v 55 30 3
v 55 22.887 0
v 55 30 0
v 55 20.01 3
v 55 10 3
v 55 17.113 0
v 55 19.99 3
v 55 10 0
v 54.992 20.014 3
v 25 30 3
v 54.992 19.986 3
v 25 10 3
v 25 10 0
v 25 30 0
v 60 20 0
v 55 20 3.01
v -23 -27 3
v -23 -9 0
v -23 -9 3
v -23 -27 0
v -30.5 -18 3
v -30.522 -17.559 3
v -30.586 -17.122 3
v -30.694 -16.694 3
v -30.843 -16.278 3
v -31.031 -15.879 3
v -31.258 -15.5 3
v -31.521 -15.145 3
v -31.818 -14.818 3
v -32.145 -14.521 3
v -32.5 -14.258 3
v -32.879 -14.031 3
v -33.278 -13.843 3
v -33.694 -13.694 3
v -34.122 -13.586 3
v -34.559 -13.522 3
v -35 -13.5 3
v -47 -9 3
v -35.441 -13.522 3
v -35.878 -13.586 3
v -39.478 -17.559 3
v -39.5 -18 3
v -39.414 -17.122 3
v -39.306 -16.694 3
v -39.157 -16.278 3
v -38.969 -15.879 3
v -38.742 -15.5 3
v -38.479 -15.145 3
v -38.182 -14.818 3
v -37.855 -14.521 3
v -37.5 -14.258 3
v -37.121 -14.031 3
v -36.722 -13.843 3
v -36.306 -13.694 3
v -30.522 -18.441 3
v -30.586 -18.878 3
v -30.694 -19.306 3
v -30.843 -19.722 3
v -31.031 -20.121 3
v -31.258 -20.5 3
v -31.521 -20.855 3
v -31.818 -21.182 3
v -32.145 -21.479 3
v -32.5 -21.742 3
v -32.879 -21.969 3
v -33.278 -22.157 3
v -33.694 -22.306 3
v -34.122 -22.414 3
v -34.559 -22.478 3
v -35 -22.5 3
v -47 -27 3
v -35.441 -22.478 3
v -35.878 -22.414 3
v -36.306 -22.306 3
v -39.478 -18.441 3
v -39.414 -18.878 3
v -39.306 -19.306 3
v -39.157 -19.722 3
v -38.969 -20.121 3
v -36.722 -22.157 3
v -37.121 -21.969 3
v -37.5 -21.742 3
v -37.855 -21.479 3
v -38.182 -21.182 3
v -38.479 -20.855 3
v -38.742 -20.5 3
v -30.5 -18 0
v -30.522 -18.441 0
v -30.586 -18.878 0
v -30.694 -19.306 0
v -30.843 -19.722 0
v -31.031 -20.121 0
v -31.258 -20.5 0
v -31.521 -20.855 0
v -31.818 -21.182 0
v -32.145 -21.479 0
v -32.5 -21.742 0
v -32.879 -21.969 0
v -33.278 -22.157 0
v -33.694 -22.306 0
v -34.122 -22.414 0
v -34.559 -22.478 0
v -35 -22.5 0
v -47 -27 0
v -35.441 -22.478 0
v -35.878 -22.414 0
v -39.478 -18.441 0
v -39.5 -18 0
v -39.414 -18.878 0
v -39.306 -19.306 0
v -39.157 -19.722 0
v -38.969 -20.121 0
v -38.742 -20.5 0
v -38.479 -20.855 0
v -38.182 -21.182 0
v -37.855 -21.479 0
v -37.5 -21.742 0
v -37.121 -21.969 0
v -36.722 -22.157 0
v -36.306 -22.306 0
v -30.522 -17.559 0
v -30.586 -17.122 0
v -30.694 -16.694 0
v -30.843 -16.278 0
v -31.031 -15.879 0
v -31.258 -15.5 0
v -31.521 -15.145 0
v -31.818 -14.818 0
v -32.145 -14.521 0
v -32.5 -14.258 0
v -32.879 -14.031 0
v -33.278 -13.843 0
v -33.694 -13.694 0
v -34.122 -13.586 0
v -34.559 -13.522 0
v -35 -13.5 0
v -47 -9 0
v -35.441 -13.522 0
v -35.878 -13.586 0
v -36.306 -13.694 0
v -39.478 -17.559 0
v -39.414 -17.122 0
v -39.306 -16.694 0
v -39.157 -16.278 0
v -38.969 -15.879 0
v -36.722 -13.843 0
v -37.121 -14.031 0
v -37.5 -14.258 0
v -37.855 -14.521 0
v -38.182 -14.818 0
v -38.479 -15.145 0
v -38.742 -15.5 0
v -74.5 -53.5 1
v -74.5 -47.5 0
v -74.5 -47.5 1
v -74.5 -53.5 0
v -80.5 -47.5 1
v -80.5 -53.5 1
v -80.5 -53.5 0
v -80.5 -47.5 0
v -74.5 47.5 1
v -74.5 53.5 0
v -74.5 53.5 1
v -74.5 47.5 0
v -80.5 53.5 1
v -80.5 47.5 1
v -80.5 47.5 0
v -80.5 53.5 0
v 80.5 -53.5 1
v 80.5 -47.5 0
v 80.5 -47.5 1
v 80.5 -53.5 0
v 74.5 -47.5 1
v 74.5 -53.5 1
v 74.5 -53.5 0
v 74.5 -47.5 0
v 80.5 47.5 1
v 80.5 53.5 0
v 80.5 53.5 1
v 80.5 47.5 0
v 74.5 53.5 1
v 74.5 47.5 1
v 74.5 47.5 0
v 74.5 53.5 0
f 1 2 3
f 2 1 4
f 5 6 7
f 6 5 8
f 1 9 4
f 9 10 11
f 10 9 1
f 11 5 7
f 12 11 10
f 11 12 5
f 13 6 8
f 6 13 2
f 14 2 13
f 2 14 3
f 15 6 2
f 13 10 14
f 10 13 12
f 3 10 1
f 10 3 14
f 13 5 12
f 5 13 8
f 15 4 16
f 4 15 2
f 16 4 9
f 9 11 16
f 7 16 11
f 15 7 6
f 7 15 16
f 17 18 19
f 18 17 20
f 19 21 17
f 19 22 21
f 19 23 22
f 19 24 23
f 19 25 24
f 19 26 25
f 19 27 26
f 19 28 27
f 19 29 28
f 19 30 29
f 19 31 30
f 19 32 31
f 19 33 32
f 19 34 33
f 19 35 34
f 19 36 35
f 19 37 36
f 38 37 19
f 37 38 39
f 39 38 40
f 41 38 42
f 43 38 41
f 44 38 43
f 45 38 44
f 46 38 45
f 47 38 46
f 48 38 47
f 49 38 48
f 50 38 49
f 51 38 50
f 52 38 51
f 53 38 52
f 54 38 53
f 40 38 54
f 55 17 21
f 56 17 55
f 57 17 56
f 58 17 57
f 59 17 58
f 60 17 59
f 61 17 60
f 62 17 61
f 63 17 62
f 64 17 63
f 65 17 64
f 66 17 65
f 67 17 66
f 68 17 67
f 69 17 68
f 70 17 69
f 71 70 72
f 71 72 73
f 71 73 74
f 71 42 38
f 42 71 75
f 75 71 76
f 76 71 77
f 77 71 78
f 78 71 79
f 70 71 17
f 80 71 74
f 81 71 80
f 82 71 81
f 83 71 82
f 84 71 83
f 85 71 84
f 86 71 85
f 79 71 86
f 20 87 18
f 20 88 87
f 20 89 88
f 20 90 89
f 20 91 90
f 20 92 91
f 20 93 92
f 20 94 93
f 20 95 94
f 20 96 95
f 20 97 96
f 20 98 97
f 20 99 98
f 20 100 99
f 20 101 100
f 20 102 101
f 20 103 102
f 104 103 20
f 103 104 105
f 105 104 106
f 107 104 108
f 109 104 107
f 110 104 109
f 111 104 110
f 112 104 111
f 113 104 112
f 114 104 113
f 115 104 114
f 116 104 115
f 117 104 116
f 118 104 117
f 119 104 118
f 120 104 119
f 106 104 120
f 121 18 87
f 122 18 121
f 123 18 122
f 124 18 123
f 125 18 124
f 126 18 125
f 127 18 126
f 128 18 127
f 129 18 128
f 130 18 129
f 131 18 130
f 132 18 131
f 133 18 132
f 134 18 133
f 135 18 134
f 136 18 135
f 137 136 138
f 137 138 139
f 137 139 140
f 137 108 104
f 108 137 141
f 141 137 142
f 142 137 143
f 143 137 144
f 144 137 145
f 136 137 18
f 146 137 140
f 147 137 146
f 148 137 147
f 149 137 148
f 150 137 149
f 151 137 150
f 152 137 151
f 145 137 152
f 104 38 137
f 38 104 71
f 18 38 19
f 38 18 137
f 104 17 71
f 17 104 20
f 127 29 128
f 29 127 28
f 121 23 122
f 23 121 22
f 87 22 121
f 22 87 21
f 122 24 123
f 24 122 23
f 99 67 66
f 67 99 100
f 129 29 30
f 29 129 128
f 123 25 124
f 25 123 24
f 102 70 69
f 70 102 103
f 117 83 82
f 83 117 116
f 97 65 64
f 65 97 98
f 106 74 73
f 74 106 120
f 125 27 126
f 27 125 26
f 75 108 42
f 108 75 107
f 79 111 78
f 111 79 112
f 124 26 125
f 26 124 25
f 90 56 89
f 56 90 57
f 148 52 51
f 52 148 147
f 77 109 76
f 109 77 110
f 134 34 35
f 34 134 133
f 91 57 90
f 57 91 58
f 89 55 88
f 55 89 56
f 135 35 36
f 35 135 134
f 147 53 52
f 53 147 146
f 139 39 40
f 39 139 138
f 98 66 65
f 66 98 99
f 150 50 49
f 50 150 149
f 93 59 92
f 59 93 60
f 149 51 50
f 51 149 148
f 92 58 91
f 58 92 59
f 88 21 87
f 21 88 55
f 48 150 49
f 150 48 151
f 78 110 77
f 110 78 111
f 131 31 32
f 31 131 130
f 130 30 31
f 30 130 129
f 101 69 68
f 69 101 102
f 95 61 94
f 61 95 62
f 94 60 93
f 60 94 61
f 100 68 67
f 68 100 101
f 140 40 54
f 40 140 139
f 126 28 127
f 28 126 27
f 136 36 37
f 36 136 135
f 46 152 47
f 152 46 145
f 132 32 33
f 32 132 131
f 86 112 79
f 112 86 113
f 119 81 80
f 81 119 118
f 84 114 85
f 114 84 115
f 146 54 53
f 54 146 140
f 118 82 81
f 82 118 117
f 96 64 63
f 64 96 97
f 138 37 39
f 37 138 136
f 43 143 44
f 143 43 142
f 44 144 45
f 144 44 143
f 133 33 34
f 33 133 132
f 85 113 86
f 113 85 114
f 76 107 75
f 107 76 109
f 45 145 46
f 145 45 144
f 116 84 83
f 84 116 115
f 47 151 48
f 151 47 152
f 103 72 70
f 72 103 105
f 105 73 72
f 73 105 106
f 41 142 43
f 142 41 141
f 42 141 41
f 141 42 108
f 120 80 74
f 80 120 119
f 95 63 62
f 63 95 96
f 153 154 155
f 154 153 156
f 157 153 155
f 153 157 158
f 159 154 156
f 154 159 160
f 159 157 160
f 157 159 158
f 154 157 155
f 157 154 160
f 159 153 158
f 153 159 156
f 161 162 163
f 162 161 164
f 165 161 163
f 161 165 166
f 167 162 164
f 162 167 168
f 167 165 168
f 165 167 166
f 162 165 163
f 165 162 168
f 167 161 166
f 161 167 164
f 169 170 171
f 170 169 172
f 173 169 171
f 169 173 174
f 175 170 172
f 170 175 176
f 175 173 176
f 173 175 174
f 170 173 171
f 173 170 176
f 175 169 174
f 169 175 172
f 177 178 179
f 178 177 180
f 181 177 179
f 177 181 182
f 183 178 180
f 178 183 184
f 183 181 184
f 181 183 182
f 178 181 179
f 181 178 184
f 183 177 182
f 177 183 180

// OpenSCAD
// CHITUBOX に座標をそのまま使わせるための「四隅のアンカー」試験片 ── 2026-08-31
// ============================================================
// 🔴 何のための物か
//   フィルムの同じ所ばかり使わないために、刷る物をプレート上で毎回ずらしたい。
//   ところが CHITUBOX は読み込んだ物の bbox の中心をプレート中央へ置くので、
//   位置を直接は指定できない（chitubox_coord_test.scad で確認済み）。
//
//   🔒 ユーザー案（2026-08-31）:
//     ・**アンカーを一緒に書き出して bbox を決めてしまう**
//     ・**アンカーはプレートの外に置く。**ビルドエリアの外は露光されないので刷られない。
//       ⇒ 読み込んだ後に消す工程すら要らない
//     ・**四隅に 4 個**置いて対称にすると、合わせた bbox の中心がプレート中央と一致する。
//       ⇒ 中央へ寄せられても**何も動かない**＝書き出した座標がそのまま生きる
//
//   ⚠ アンカー 1 個だと、動く量は「アンカーまでの距離の半分」になり、位置ごとに
//     距離を計算し直すことになる。4 個で囲めばその計算自体が要らない。
//   ⚠ 「印刷されないほど小さい点」で bbox をずらす手は採らない。小さい点は硬化しないとは
//     限らず、固まればフィルムに貼り付いた小片になる。守るための細工が傷める側に回る。
//
// ------------------------------------------------------------
// この試験片が潰す問い（本番はこれ）
// ------------------------------------------------------------
//   ① ビルドエリアの**外**にある物を、CHITUBOX は黙って無視するか
//   ② それとも警告を出すか／スライスを拒むか
//   ③ それとも**勝手に縮小して収めるか**   ← これをやられると案は全部おしまい
//   ④ 中の部品は、書き出した座標（下の表）のまま出るか
//
// ------------------------------------------------------------
// 使い方（2 分）
// ------------------------------------------------------------
//   1. stl/test/anchor_test.stl を CHITUBOX に **1 つだけ**読み込む
//   2. 読み込んだ直後に、次の 3 つを見る
//        ・**矢印の板**が右上に出ているか（下の表の位置）
//        ・**穴あきの板**が左下に出ているか
//        ・四隅のアンカー（小さい四角）が**プレートの枠の外**に居るか
//   3. 寸法表示があれば、モデルの大きさが 161.0 x 107.0 のままかを見る
//      （縮小されていたら ③ で不成立）
//   4. スライスしてみて、警告が出るか・通るかを見る
//
// ------------------------------------------------------------
// ✅ 2026-08-31 結果（ユーザーが CHITUBOX Basic V2.3 / ELEGOO Mars 3 で実施）
// ------------------------------------------------------------
//   ✅ **成立した。**
//   ・座標はそのまま生きた（矢印の板が右上、穴あきの板が左下。書き出したとおり）
//   ・アンカー 4 個はプレートの枠の外に赤く出た（＝範囲外の表示）
//   ・縮小されなかった
//   ・スライス時に「モデルは印刷プラットフォームを超えていますが、続行するかどうか?」の
//     警告が出るが、**「はい」で普通にスライスできる**
//   ・⭐ **アンカーは露光されない。**体積がスライス前 3.06ml → スライス後 2.91994ml。
//     差 0.14ml ＝ 140mm³ で、アンカー 4 個（6×6×1 × 4 ＝ 144mm³）とほぼ一致する。
//     層の絵にも部品 2 つしか出ない
//   ⇒ **書き出す STL に四隅のアンカーを入れれば、座標をそのまま渡せる。**
//     移動量を人が CHITUBOX の数値欄に打つ方式は要らなくなる
//
//   読める結果:
//     ✅ 部品が表の位置に出て、アンカーは枠の外、スライスも通る
//        → 案は成立。座標がそのまま渡るので、移動量を打つ工程が消える
//     ❌ 全体が縮小される／スライスを拒まれる → 不成立。移動量を人が数値欄に打つ方式のまま
//     ⚠ 警告は出るが通る → 成立。ただし毎回警告が出ることを覚えておく
//
// ------------------------------------------------------------
// 期待される位置（Mars 3 のプレート 143 x 89・中心を原点とみなす）
// ------------------------------------------------------------
//   矢印の板     … 中心 ( 40,  20)   +X 側へ矢印が出ている
//   穴あきの板   … 中心 (-35, -18)   真ん中に穴
//   アンカー 4 個 … 中心 (±80.5, ±53.5)  ＝ プレートの縁から外へ 6mm ／ 各 6 x 6 x 1
//                    外端は ±80.5 / ±53.5 なので、全体は 161.0 x 107.0
//   ⇒ 4 個は原点対称なので、合わせた bbox の中心は (0, 0) ＝ プレート中央。
//     だから中央へ寄せられても、部品は動かない。
//
// ------------------------------------------------------------
// 焼き方
// ------------------------------------------------------------
//   openscad --backend=manifold -o stl/test/anchor_test.stl hardware/chitubox_anchor_test.scad
//
// ⚠ これは刷る物ではない。読み込んで位置を見るだけの物である。
// ============================================================
$fn = 64;

PLATE = [143.0, 89.0];   // Mars 3
OUT   = 6.0;             // プレートの縁からどれだけ外へ出すか
ANC   = 6.0;             // アンカーの一辺
ANC_T = 1.0;             // アンカーの厚み（見えれば足りる）
T     = 3.0;             // 部品の厚み

PART_A_AT = [ 40,  20];  // 矢印の板
PART_B_AT = [-35, -18];  // 穴あきの板

module part_arrow() {
    translate(PART_A_AT) {
        translate([-15, -10, 0]) cube([30, 20, T]);
        translate([15, 0, 0]) cylinder(d1 = 10, d2 = 0, h = T + 0.01, $fn = 3);
    }
}

module part_hole() {
    translate(PART_B_AT) difference() {
        translate([-12, -9, 0]) cube([24, 18, T]);
        translate([0, 0, -1]) cylinder(d = 9, h = T + 2);
    }
}

// 四隅のアンカー。🔒 **原点対称に 4 個**。1 個でも欠けると bbox の中心がずれる
module anchors() {
    ax = PLATE[0] / 2 + OUT;
    ay = PLATE[1] / 2 + OUT;
    for (sx = [-1, 1], sy = [-1, 1])
        translate([sx * ax - ANC / 2, sy * ay - ANC / 2, 0]) cube([ANC, ANC, ANC_T]);
}

part_arrow();
part_hole();
anchors();

AX = PLATE[0] / 2 + OUT + ANC / 2;
AY = PLATE[1] / 2 + OUT + ANC / 2;
echo(str("アンカーの外端 ±", AX, " / ±", AY, " → 全体の大きさ ", 2 * AX, " x ", 2 * AY));
echo(str("bbox の中心 (0, 0) ＝ プレート中央。だから中央合わせで部品は動かない"));
echo(str("矢印の板 ", PART_A_AT, " ／ 穴あきの板 ", PART_B_AT));
